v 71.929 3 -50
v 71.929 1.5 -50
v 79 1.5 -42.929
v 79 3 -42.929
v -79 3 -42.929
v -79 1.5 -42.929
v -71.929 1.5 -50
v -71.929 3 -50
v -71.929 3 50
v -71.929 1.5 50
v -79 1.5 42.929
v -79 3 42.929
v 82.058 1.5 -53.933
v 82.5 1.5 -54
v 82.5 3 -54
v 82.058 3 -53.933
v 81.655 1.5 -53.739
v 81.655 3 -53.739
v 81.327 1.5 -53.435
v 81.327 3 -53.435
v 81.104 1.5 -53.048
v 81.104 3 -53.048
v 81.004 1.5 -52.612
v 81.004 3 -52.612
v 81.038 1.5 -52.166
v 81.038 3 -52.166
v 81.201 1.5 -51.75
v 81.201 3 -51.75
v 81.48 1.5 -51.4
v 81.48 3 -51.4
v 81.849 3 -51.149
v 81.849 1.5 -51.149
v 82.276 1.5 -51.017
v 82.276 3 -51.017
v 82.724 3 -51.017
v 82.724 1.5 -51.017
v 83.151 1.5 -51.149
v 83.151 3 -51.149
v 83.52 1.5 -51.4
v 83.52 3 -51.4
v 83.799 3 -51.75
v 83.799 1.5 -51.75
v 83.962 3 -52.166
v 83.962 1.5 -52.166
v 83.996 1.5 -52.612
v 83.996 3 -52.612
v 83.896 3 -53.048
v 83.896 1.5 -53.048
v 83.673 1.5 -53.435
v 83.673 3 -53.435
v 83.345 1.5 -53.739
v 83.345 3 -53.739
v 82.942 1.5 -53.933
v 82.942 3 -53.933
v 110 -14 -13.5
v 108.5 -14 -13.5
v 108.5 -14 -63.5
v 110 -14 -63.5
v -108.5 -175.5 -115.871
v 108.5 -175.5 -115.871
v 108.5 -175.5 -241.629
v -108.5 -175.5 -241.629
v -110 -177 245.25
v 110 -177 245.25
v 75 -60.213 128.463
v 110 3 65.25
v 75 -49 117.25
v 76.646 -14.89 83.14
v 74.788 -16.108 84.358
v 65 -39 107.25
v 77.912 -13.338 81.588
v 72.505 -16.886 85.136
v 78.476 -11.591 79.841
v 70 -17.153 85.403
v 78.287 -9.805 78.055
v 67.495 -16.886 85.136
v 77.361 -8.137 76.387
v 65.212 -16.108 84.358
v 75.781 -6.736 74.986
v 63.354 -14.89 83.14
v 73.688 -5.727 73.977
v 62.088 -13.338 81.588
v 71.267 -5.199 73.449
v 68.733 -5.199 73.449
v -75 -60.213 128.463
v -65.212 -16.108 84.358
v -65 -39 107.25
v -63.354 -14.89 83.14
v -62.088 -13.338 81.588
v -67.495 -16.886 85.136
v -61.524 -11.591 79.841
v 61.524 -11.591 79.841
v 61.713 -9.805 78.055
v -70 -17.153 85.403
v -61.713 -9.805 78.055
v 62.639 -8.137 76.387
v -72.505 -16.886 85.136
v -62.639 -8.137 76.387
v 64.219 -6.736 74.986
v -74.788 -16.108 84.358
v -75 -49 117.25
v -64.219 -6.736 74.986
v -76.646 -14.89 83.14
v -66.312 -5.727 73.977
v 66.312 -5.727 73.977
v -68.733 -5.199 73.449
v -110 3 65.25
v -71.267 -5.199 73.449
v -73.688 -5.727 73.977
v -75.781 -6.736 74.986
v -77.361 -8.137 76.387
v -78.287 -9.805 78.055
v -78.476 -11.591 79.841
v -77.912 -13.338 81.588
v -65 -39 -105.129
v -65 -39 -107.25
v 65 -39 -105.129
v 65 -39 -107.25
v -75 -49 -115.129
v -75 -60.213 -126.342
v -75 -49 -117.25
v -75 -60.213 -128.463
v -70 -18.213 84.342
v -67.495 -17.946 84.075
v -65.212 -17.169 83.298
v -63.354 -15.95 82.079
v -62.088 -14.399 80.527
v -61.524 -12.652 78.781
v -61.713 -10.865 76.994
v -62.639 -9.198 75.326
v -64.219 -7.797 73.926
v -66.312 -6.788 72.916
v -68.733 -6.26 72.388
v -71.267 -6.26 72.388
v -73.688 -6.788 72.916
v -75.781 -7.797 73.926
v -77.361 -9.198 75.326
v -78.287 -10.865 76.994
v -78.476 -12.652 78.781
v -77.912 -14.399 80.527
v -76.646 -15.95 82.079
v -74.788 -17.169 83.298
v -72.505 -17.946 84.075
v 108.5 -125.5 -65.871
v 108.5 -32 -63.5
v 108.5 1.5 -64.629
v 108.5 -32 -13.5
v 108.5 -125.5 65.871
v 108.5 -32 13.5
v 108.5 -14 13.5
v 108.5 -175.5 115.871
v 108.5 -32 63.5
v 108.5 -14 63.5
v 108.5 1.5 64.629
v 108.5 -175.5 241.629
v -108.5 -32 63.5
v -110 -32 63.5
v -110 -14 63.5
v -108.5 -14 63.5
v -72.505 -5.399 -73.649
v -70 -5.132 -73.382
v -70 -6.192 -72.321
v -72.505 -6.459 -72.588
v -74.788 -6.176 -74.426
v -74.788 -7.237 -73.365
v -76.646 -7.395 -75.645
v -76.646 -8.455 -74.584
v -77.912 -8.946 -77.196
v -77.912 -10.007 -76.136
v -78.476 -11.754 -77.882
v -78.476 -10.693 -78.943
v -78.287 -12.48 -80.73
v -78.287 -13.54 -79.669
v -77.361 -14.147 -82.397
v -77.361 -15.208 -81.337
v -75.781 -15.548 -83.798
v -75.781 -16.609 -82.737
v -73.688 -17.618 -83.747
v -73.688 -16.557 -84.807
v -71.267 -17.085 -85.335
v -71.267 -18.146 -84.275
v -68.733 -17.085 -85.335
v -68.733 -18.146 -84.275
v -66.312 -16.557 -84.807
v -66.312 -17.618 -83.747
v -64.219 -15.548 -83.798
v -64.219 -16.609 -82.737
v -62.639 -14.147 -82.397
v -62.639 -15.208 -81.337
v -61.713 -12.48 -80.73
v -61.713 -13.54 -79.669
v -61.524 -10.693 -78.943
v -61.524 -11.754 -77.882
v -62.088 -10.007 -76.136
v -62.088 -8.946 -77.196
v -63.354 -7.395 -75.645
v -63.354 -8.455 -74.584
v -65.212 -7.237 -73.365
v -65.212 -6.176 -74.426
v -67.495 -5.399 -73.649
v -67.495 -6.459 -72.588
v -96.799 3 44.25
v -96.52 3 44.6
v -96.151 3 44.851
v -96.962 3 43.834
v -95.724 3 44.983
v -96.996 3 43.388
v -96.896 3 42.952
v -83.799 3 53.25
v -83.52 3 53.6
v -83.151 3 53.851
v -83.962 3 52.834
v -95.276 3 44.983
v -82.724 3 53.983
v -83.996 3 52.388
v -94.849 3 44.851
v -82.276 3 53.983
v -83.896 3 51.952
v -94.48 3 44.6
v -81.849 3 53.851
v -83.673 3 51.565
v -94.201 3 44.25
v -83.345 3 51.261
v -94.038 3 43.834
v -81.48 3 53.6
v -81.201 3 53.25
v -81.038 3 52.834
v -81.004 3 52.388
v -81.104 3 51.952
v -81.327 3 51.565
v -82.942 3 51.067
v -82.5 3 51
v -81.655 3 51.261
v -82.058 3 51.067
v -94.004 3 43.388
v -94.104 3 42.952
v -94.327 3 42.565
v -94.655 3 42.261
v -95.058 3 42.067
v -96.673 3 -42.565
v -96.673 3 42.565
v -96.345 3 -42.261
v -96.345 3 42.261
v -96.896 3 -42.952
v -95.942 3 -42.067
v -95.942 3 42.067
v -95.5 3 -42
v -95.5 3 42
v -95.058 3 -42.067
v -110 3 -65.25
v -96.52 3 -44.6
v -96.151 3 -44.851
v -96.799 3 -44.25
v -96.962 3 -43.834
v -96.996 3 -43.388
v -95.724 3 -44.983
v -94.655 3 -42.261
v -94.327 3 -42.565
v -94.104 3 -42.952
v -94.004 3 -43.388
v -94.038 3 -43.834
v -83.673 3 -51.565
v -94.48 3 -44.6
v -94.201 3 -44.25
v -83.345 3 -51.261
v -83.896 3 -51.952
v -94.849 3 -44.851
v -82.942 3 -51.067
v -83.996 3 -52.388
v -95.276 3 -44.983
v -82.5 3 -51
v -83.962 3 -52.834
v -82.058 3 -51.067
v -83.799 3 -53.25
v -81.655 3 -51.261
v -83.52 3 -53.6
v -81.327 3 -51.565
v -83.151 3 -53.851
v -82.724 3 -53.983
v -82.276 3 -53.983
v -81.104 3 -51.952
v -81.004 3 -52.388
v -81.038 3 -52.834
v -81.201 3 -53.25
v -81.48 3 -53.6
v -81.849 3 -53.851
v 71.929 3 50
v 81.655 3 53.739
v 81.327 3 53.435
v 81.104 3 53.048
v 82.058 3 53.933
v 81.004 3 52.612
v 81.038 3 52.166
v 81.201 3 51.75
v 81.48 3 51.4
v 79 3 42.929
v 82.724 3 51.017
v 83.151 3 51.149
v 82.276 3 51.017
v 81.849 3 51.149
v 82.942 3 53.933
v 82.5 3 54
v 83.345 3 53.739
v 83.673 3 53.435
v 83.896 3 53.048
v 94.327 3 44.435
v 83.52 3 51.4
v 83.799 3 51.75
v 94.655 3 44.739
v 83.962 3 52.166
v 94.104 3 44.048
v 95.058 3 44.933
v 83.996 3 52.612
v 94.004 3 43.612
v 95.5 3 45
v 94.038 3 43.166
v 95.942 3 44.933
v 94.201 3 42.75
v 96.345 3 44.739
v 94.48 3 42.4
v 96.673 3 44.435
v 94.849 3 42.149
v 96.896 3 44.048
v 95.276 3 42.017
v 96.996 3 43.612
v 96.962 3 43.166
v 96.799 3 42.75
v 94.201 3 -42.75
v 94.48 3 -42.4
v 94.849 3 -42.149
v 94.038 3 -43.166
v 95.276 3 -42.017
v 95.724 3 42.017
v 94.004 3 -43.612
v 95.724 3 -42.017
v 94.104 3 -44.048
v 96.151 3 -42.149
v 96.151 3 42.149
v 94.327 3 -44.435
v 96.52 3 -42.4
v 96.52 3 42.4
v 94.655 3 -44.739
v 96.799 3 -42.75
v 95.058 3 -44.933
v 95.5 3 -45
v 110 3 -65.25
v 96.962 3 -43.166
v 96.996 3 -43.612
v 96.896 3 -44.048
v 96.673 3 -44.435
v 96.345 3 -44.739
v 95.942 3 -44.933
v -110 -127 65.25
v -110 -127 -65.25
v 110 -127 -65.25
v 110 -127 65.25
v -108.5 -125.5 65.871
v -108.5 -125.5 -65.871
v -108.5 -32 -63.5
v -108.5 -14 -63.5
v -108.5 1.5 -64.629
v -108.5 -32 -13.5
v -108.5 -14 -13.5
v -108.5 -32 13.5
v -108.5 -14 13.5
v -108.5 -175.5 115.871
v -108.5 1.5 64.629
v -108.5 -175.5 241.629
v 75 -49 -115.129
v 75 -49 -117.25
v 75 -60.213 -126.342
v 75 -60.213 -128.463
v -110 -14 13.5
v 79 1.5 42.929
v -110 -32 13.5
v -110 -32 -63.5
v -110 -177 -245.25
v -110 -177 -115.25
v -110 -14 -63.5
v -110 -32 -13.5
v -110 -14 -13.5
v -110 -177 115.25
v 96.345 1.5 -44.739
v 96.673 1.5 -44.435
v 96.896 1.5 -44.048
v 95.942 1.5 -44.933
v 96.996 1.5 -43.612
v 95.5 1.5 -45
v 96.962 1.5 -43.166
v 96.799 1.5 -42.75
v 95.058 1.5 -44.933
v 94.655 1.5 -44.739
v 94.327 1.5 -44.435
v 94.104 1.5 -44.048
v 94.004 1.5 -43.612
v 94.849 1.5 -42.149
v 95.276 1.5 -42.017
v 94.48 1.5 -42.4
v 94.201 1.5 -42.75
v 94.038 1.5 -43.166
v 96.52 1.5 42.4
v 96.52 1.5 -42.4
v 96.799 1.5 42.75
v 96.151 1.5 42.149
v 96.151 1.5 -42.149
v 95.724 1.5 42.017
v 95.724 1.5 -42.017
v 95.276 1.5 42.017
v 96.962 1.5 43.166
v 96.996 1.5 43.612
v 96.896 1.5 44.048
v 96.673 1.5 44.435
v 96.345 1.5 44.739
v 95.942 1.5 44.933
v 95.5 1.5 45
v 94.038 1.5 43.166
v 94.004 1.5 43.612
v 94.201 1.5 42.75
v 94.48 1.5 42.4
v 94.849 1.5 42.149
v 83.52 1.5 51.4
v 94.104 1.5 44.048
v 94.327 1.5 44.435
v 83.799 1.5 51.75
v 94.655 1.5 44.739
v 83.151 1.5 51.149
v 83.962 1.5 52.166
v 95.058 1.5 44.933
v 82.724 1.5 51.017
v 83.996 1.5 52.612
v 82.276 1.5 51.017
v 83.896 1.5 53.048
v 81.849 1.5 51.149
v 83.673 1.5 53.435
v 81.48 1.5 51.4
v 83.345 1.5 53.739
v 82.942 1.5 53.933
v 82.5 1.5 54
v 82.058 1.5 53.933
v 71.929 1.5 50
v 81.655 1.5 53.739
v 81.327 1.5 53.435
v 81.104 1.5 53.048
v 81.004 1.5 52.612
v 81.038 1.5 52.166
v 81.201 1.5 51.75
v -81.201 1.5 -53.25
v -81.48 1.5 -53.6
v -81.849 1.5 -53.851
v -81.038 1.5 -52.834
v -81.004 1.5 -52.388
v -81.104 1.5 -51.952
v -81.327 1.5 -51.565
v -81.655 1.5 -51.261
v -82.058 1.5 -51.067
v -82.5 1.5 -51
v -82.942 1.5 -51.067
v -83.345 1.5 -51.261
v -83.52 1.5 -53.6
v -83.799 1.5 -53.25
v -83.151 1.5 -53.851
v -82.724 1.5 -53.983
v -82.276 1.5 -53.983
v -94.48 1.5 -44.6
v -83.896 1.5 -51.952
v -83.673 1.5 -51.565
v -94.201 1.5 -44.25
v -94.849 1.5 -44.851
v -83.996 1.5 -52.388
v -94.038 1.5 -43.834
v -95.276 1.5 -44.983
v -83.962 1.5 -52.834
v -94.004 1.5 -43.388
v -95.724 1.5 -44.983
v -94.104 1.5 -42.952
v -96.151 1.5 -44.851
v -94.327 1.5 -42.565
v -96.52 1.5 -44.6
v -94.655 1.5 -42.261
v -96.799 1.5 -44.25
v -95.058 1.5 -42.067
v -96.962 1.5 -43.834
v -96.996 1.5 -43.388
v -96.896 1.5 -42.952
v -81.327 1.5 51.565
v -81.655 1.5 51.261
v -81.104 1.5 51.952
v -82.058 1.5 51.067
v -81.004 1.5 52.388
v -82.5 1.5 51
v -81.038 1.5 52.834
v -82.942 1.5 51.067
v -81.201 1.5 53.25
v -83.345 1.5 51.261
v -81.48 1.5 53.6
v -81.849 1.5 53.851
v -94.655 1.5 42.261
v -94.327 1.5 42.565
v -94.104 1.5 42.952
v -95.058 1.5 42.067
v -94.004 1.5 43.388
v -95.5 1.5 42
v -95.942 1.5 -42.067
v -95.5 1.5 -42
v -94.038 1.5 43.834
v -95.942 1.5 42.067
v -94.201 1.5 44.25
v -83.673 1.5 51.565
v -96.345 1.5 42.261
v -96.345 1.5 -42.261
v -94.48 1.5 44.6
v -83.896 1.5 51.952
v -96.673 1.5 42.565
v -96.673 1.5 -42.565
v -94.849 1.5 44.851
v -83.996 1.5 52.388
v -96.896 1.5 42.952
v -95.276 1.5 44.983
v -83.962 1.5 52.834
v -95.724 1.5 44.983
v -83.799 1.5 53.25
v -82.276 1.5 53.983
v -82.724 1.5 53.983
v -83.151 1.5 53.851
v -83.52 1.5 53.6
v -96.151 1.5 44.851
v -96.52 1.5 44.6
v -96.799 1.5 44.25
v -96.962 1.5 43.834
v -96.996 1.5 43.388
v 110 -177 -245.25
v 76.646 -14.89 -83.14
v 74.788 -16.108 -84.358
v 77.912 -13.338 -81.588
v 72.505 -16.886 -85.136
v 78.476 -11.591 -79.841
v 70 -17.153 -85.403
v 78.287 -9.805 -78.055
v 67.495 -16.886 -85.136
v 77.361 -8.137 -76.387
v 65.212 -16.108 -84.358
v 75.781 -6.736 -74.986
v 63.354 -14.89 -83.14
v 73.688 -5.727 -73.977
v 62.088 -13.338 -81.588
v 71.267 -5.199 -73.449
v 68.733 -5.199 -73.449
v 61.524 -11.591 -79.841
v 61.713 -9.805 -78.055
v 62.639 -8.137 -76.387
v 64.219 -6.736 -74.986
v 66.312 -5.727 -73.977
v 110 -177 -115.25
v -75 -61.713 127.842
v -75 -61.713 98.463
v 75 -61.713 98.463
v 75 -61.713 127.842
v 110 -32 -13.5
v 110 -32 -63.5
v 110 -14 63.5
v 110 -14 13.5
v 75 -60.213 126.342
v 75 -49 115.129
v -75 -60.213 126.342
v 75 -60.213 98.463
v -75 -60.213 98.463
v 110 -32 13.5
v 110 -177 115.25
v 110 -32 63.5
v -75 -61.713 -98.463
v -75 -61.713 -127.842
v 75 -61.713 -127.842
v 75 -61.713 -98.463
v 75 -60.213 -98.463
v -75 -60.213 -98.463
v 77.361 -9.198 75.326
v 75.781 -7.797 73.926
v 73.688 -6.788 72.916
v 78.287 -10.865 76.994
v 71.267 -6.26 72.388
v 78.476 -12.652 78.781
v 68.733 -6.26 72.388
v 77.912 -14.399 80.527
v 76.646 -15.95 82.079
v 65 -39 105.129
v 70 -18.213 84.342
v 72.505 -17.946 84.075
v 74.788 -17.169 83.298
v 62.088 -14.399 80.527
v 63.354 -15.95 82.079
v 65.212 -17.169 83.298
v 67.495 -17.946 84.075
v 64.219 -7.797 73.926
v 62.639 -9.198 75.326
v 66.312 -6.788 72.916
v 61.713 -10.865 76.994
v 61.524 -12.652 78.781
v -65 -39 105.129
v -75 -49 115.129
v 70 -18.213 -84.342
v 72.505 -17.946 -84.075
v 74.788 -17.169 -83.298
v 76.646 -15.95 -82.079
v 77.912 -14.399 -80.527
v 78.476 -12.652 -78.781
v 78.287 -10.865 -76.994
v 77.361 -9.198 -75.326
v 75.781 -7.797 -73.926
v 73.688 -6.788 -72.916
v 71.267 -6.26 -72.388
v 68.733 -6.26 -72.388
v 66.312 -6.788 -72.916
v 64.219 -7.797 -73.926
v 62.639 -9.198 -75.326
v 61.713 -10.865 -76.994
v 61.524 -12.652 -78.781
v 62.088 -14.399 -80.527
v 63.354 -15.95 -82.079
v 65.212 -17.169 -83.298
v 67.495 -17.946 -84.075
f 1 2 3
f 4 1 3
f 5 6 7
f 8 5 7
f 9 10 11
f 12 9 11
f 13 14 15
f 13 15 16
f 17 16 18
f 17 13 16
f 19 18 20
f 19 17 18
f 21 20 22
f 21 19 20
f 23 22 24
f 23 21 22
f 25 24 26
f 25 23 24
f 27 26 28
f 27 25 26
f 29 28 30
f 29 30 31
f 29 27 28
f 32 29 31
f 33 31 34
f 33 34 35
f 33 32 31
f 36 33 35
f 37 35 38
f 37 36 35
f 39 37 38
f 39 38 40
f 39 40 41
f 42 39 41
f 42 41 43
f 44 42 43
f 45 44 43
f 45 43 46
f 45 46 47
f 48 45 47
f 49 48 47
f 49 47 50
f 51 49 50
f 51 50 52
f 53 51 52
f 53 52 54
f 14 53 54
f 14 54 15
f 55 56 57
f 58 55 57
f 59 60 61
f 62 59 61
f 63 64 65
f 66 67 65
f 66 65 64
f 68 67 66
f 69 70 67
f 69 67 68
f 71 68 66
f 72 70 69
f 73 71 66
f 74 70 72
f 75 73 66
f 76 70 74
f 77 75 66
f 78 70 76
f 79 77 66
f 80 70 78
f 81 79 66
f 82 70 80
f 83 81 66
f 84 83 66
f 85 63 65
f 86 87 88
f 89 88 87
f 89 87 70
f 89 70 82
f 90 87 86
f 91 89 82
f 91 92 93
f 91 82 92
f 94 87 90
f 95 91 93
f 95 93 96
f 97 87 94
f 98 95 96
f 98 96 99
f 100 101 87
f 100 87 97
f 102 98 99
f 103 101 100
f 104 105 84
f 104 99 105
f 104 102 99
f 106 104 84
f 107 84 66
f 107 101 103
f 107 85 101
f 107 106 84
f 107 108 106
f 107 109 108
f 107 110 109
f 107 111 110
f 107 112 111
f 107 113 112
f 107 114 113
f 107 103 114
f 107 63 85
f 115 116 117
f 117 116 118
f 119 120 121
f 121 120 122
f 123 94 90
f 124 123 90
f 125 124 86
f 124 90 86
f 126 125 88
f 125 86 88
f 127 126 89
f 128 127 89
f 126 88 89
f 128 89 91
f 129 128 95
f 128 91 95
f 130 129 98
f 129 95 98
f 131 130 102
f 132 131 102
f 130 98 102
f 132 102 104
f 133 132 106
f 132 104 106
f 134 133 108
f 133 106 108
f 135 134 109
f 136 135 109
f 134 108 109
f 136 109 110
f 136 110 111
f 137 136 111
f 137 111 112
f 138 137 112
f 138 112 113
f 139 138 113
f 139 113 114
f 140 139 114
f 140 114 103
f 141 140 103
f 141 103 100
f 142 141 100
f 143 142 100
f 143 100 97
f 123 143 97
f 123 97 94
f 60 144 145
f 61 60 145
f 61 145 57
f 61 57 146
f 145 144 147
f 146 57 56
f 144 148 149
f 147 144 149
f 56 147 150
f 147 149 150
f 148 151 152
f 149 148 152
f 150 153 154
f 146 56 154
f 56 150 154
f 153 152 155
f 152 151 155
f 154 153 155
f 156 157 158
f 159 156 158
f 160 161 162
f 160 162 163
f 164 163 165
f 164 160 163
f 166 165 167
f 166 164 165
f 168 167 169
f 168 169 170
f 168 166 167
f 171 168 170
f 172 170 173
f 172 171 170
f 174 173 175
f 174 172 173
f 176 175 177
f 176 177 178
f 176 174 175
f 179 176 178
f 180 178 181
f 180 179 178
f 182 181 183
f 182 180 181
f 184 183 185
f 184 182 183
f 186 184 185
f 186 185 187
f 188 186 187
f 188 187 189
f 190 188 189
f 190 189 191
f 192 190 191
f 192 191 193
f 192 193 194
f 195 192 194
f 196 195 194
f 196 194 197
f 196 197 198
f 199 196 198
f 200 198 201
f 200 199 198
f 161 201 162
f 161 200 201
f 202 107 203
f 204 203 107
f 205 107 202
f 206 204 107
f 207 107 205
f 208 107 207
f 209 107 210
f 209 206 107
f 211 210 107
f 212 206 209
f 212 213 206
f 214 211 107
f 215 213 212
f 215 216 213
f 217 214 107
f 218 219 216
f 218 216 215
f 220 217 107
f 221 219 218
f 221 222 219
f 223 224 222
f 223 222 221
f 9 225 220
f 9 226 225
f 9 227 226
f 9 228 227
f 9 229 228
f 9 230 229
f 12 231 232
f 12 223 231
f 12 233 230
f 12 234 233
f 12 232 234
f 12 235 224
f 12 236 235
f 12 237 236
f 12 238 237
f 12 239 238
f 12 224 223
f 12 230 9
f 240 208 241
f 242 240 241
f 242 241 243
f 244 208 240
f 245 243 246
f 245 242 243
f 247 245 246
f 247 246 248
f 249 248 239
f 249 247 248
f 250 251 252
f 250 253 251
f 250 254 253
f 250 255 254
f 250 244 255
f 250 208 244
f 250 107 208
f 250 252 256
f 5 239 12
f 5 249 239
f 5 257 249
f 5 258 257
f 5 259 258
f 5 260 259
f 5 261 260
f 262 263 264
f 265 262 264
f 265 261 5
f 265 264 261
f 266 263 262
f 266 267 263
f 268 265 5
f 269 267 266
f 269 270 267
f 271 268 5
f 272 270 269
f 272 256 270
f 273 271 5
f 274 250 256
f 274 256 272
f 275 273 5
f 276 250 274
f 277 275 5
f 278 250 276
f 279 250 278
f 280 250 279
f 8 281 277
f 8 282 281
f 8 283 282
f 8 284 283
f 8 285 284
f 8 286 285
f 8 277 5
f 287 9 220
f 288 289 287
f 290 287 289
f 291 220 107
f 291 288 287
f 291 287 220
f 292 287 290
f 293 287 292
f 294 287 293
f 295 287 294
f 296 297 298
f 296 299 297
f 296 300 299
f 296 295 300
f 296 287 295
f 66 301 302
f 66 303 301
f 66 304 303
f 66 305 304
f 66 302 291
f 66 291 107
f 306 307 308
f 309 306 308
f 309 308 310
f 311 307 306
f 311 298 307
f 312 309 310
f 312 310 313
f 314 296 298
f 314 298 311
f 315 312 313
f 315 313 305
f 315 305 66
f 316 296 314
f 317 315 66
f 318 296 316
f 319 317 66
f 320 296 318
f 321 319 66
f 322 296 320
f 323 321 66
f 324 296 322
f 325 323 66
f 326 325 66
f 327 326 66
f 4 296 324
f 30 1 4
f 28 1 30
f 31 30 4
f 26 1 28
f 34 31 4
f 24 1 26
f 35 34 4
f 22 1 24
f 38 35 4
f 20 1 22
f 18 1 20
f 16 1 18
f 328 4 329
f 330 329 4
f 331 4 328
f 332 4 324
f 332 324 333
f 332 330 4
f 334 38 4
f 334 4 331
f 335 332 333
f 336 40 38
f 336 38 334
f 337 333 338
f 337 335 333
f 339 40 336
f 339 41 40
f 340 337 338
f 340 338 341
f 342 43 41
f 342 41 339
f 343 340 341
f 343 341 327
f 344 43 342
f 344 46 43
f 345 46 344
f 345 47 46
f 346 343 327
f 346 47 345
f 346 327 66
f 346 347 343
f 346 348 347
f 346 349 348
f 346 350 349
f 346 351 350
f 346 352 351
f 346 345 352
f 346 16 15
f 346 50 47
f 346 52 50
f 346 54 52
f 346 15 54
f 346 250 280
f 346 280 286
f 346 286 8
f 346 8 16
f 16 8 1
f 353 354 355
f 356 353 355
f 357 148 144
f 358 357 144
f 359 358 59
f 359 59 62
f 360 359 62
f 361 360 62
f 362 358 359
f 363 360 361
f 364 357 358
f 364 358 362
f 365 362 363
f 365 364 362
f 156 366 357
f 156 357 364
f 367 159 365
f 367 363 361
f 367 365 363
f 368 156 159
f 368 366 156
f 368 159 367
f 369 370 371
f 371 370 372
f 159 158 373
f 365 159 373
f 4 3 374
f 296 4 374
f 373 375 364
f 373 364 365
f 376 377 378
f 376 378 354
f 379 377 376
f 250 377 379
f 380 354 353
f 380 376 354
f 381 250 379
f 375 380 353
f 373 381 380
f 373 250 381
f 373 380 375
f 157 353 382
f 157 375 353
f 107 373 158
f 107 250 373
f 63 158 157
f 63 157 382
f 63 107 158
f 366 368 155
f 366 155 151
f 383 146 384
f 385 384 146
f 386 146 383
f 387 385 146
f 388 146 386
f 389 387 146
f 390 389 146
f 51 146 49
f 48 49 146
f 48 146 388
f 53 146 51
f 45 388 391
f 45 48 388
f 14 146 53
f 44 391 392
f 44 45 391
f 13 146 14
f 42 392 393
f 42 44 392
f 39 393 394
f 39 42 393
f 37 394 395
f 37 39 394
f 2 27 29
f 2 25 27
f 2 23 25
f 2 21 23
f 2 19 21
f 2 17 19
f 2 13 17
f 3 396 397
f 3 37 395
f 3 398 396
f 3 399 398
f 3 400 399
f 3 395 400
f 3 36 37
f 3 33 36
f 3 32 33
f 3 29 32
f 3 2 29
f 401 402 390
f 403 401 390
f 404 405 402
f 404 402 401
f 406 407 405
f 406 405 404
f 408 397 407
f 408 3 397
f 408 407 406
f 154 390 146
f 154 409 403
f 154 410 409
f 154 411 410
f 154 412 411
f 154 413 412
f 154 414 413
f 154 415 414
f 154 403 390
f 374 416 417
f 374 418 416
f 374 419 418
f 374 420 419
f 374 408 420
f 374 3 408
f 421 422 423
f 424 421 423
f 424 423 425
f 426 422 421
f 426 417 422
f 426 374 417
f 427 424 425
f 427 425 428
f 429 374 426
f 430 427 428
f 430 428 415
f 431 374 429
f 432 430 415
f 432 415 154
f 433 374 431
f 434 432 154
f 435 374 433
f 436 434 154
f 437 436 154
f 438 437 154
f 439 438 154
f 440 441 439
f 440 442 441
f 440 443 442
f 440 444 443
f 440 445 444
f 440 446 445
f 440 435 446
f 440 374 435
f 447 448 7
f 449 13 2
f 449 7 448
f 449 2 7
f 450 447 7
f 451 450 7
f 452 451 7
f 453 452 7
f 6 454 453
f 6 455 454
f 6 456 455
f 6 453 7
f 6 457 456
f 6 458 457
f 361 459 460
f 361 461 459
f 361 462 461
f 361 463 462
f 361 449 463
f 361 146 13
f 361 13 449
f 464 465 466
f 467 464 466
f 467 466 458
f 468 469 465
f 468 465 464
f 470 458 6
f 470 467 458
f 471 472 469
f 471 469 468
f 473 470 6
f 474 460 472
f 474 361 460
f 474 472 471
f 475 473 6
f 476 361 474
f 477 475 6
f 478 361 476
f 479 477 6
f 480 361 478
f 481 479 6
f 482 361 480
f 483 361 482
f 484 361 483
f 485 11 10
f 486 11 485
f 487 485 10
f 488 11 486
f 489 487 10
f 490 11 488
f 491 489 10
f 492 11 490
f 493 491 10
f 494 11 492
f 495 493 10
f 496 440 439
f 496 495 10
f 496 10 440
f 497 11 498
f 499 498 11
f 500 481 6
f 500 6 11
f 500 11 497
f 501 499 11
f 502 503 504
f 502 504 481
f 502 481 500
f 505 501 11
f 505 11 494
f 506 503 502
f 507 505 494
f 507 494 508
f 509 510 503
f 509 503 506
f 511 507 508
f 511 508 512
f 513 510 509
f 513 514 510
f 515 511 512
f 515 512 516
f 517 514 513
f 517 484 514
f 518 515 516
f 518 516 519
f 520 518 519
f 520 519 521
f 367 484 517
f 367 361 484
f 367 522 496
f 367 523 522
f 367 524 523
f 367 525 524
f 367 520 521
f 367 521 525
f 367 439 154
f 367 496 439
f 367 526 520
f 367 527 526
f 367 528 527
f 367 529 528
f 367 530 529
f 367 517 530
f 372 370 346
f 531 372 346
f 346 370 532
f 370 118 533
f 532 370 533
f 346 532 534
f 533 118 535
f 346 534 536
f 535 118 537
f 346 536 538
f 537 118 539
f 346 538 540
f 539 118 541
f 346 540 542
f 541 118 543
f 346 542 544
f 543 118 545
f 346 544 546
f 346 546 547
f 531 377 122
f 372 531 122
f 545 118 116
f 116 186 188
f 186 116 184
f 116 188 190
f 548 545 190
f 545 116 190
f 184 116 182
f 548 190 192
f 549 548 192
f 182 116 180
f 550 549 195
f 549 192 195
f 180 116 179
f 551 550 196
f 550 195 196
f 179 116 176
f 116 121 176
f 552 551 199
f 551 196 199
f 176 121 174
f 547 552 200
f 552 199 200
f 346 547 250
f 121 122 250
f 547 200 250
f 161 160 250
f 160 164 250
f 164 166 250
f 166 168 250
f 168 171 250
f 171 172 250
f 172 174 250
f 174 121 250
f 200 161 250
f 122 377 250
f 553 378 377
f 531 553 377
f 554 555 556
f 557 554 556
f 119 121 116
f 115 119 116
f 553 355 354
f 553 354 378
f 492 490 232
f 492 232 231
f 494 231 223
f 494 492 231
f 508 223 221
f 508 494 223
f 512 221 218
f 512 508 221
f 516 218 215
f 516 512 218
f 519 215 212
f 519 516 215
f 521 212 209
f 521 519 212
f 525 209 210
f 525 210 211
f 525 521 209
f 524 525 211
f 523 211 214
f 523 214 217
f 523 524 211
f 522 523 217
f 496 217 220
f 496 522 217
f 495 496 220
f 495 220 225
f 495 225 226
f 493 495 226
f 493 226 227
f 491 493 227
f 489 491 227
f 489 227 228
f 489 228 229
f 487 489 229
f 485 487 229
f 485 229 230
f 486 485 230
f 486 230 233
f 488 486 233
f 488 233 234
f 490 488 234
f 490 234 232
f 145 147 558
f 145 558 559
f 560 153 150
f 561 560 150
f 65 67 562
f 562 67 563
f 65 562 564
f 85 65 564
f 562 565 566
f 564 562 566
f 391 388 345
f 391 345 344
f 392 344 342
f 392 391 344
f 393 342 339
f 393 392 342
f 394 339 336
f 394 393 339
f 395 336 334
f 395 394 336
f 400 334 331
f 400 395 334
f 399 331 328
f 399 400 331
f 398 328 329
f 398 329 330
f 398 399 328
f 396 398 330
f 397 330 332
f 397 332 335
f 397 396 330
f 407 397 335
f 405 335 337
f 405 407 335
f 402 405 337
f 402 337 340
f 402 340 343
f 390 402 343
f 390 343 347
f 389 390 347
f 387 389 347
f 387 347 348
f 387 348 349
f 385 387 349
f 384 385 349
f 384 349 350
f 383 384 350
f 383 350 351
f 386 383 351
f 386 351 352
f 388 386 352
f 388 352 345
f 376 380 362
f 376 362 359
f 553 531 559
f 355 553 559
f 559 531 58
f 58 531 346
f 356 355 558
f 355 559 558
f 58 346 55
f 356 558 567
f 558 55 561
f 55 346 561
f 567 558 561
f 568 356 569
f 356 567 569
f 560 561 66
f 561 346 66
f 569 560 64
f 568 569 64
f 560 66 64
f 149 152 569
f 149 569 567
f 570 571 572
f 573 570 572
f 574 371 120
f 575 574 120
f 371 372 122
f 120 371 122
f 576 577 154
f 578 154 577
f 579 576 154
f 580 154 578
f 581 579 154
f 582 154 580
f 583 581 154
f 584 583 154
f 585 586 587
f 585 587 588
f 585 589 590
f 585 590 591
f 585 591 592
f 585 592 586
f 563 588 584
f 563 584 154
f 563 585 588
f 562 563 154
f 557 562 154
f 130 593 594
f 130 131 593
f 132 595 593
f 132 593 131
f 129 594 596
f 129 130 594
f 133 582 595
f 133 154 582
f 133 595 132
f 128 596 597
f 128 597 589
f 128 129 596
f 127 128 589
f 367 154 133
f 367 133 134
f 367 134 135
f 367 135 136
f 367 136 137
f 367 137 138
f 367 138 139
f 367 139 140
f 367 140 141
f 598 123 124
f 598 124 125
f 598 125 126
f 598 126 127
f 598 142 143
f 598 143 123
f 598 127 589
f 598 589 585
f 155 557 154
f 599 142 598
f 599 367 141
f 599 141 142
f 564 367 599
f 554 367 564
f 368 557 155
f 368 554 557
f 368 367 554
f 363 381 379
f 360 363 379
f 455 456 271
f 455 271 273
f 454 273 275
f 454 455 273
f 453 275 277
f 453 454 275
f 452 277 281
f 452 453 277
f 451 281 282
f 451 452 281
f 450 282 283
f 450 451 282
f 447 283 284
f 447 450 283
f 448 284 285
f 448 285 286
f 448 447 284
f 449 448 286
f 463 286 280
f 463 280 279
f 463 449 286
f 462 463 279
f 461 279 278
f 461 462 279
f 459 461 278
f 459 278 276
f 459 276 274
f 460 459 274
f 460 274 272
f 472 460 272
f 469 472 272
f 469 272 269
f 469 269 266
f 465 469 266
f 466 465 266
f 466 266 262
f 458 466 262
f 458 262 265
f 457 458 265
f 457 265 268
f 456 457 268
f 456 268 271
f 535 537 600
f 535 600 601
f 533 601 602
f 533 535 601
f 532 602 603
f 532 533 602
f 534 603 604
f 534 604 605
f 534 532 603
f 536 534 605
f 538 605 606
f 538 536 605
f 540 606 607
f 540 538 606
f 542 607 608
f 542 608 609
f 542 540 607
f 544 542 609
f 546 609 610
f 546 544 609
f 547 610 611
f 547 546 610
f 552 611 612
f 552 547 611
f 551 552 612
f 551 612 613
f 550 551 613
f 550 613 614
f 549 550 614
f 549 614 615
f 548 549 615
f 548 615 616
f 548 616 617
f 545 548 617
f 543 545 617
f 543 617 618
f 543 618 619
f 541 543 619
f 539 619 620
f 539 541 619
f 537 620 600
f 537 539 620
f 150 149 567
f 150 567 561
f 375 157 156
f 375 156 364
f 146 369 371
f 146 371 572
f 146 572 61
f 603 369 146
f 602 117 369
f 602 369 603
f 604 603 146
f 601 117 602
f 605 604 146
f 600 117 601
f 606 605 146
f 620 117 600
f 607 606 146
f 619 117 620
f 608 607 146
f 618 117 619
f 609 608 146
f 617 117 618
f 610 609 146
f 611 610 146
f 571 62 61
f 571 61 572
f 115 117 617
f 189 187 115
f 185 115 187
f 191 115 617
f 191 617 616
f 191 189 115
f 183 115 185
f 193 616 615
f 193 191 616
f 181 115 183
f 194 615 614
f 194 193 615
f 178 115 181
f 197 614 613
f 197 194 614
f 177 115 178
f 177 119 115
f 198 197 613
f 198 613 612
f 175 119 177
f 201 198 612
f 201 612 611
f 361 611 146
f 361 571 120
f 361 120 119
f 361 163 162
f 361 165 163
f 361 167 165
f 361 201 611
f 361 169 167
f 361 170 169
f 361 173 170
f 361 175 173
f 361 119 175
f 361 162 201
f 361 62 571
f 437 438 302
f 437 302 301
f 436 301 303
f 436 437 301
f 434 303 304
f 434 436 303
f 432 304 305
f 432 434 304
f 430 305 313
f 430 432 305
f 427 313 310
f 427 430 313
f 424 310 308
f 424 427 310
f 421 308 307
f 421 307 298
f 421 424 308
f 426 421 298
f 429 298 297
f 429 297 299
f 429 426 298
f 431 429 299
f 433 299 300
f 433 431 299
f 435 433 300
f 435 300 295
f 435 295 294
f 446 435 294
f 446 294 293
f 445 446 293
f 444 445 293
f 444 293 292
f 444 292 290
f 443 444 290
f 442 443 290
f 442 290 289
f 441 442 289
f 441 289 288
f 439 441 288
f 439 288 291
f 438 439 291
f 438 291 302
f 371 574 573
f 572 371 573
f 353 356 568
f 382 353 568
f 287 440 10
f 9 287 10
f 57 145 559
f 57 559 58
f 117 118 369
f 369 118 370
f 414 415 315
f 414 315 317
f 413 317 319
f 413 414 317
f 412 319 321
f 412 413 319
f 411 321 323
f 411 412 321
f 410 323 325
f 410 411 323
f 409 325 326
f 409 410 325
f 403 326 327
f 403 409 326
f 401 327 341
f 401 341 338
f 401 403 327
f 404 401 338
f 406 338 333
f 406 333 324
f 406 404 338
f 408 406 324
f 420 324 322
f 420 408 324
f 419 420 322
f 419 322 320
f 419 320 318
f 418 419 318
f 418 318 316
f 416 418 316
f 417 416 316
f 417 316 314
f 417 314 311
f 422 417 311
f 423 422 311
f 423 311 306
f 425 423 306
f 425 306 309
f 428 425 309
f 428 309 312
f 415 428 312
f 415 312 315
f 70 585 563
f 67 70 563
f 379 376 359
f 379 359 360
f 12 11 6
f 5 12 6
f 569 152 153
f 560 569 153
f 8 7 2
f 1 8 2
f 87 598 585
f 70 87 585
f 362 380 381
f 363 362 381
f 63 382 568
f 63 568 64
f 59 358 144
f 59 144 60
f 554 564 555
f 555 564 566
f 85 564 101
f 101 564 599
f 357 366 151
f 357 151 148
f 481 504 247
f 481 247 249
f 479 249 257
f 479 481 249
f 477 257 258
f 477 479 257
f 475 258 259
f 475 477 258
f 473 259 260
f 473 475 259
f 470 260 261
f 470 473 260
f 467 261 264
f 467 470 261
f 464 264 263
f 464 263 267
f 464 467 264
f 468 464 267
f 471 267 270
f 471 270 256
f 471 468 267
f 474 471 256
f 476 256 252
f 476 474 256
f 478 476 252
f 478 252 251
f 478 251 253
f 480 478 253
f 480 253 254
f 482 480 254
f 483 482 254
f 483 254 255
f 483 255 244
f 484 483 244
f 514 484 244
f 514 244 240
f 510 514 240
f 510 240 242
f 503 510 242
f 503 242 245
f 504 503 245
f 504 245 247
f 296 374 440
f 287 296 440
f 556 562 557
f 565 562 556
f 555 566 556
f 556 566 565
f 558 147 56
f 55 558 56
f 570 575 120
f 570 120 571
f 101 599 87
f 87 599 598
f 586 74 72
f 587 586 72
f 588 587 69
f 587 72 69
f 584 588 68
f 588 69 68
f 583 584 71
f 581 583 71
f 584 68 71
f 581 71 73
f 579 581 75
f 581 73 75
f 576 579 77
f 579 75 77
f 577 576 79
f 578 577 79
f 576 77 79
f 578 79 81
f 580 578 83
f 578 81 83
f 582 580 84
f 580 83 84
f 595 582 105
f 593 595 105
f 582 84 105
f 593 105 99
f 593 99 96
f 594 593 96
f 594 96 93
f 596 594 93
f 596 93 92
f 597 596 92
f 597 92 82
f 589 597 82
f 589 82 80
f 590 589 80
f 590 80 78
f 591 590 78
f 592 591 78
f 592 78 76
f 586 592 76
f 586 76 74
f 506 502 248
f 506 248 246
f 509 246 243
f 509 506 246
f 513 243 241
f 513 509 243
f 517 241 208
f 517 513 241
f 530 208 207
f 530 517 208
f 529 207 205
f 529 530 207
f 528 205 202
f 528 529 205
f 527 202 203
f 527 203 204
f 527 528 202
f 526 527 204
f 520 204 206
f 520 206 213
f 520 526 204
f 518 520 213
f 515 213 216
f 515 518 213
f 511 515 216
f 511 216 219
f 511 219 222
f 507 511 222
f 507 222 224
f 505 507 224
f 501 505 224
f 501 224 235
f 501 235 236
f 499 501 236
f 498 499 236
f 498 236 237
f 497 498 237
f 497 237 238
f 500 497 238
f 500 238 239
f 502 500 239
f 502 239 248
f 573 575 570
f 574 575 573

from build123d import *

# Parameters (mm, degrees)
SKETCH1_W                = 220
SKETCH1_H                = 130.5
BOSS_EXTRUDE1_DEPTH      = 3
SKETCH5_W                = 220
SKETCH5_H                = 130.5
BOSS_EXTRUDE2_DEPTH      = 127
SKETCH6_W                = 220
SKETCH6_H                = 130.5
BOSS_EXTRUDE3_DEPTH      = 1
BOSS_EXTRUDE4_DEPTH      = 110
BOSS_EXTRUDE4_DEPTH_BACK = 110
SHELL2_START             = -108.5
SHELL2_DEPTH             = 217
SKETCH2_R                = 1.5
CUT_EXTRUDE1_DEPTH       = 3
CUT_EXTRUDE2_DEPTH       = 10
CUT_EXTRUDE3_DEPTH       = 322.833128344
CUT_EXTRUDE3_DEPTH_BACK  = 322.833128344
SKETCH7_W                = 50
SKETCH7_H                = 18
SKETCH9_R                = 8.5
CUT_EXTRUDE4_DEPTH       = 10
CUT_EXTRUDE5_DEPTH       = 322.833128344
CUT_EXTRUDE5_DEPTH_BACK  = 322.833128344
SKETCH11_W               = 150
SKETCH11_H               = 30
BOSS_EXTRUDE5_DEPTH      = 1.5
SKETCH12_R               = 8.5
CUT_EXTRUDE6_DEPTH       = 1.5


# Read off the part's stored shape, not the designer's step: Shell2
with BuildPart() as part:
    # Sketch1 → Boss-Extrude1 (new body)
    with BuildSketch(Plane(origin=(0, 0, 0), x_dir=(1, 0, 0), z_dir=(0, 1, 0))):
        Rectangle(SKETCH1_W, SKETCH1_H)
    extrude(amount=BOSS_EXTRUDE1_DEPTH)

    # Sketch5 → Boss-Extrude2 (add)
    with BuildSketch(Plane(origin=(0, 0, 0), x_dir=(1, 0, 0), z_dir=(0, 1, 0))):
        Rectangle(SKETCH5_W, SKETCH5_H)
    extrude(amount=-BOSS_EXTRUDE2_DEPTH)

    # Sketch6 → Boss-Extrude3 (add)
    with BuildSketch(Plane.XZ.offset(127)):
        Rectangle(SKETCH6_W, SKETCH6_H)
    extrude(amount=-BOSS_EXTRUDE3_DEPTH)

    # Sketch8 → Boss-Extrude4 (add, two sides: drawn at the far end of the back side and taken through both)
    with BuildSketch(Plane(origin=(0, 0, 0), x_dir=(0, 0, -1), z_dir=(1, 0, 0)).offset(-BOSS_EXTRUDE4_DEPTH_BACK)):
        Polygon((-65.25, 3), (-65.25, -127), (-115.25, -177), (-245.25, -177), align=None)
        Polygon((245.25, -177), (65.25, 3), (65.25, -127), (115.25, -177), align=None)
    extrude(amount=BOSS_EXTRUDE4_DEPTH + BOSS_EXTRUDE4_DEPTH_BACK)

    # Shell2 outline → Shell2 (cut)
    with BuildSketch(Plane.YZ.offset(SHELL2_START)):
        Polygon((-175.5, -241.628679656), (1.5, -64.628679656), (1.5, 64.628679656), (-175.5, 241.628679656), (-175.5, 115.871320344), (-125.5, 65.871320344), (-125.5, -65.871320344), (-175.5, -115.871320344), align=None)
    extrude(amount=SHELL2_DEPTH, mode=Mode.SUBTRACT)

    # Sketch2 → Cut-Extrude1 (cut)
    with BuildSketch(Plane(origin=(0, 0, 0), x_dir=(1, 0, 0), z_dir=(0, 1, 0))):
        with Locations(Location((-82.5, 52.5, 0), (0, 0, 270))):
            Circle(SKETCH2_R)
        with Locations(Location((-82.5, -52.5, 0), (0, 0, 90))):
            Circle(SKETCH2_R)
        with Locations(Location((82.5, -52.5, 0), (0, 0, 270))):
            Circle(SKETCH2_R)
        with Locations(Location((82.5, 52.5, 0), (0, 0, 90))):
            Circle(SKETCH2_R)
        with Locations(Location((-95.5, 43.5, 0), (0, 0, 270))):
            Circle(SKETCH2_R)
        with Locations(Location((-95.5, -43.5, 0), (0, 0, 90))):
            Circle(SKETCH2_R)
        with Locations(Location((95.5, -43.5, 0), (0, 0, 270))):
            Circle(SKETCH2_R)
        with Locations(Location((95.5, 43.5, 0), (0, 0, 90))):
            Circle(SKETCH2_R)
    extrude(amount=CUT_EXTRUDE1_DEPTH, mode=Mode.SUBTRACT)

    # Sketch4 → Cut-Extrude2 (cut)
    with BuildSketch(Plane(origin=(0, 0, 0), x_dir=(1, 0, 0), z_dir=(0, 1, 0))):
        Polygon((-79, 42.928932188), (-71.928932188, 50), (71.928932188, 50), (79, 42.928932188), (79, -42.928932188), (71.928932188, -50), (-71.928932188, -50), (-79, -42.928932188), align=None)
    extrude(amount=CUT_EXTRUDE2_DEPTH, mode=Mode.SUBTRACT)

    # Sketch7 → Cut-Extrude3 (cut, two sides: drawn at the far end of the back side and taken through both)
    with BuildSketch(Plane(origin=(0, 0, 0), x_dir=(0, 0, -1), z_dir=(1, 0, 0)).offset(-CUT_EXTRUDE3_DEPTH_BACK)):
        with Locations((-38.5, -23)):
            Rectangle(SKETCH7_W, SKETCH7_H)
        with Locations((38.5, -23)):
            Rectangle(SKETCH7_W, SKETCH7_H)
    extrude(amount=CUT_EXTRUDE3_DEPTH + CUT_EXTRUDE3_DEPTH_BACK, mode=Mode.SUBTRACT)

    # Sketch9 → Cut-Extrude4 (cut)
    with BuildSketch(Plane(origin=(0, 34.125, 34.125), x_dir=(1, 0, 0), z_dir=(0, 0.7071067811865435, 0.7071067811865517))):
        with Locations(Location((70, -64.017397129, 0), (0, 0, 270))):
            Circle(SKETCH9_R)
        with Locations(Location((-70, -64.017397129, 0), (0, 0, 270))):
            Circle(SKETCH9_R)
    extrude(amount=-CUT_EXTRUDE4_DEPTH, mode=Mode.SUBTRACT)

    # Sketch10 → Cut-Extrude5 (cut, two sides: drawn at the far end of the back side and taken through both)
    with BuildSketch(Plane.XY.offset(-CUT_EXTRUDE5_DEPTH_BACK)):
        Polygon((-75, -49), (-65, -39), (65, -39), (75, -49), (75, -60.2132), (-75, -60.2132), align=None)
    extrude(amount=CUT_EXTRUDE5_DEPTH + CUT_EXTRUDE5_DEPTH_BACK, mode=Mode.SUBTRACT)

    # Sketch11 → Boss-Extrude5 (add)
    with BuildSketch(Plane(origin=(0, -60.2132, 0), x_dir=(1, 0, 0), z_dir=(0, 1, 0))):
        with Locations((0, -113.4632)):
            Rectangle(SKETCH11_W, SKETCH11_H)
        with Locations((0, 113.4632)):
            Rectangle(SKETCH11_W, SKETCH11_H)
    extrude(amount=-BOSS_EXTRUDE5_DEPTH)

    # Sketch12 → Cut-Extrude6 (cut)
    with BuildSketch(Plane(origin=(0, 19.989962184, -48.260037816), x_dir=(1, 0, 0), z_dir=(0, -0.7071067811865438, 0.7071067811865513))):
        with Locations(Location((70, -44.027434945, 0), (0, 0, 270))):
            Circle(SKETCH12_R)
        with Locations(Location((-70, -44.027434945, 0), (0, 0, 90))):
            Circle(SKETCH12_R)
    extrude(amount=CUT_EXTRUDE6_DEPTH, mode=Mode.SUBTRACT)


solid = part.part
